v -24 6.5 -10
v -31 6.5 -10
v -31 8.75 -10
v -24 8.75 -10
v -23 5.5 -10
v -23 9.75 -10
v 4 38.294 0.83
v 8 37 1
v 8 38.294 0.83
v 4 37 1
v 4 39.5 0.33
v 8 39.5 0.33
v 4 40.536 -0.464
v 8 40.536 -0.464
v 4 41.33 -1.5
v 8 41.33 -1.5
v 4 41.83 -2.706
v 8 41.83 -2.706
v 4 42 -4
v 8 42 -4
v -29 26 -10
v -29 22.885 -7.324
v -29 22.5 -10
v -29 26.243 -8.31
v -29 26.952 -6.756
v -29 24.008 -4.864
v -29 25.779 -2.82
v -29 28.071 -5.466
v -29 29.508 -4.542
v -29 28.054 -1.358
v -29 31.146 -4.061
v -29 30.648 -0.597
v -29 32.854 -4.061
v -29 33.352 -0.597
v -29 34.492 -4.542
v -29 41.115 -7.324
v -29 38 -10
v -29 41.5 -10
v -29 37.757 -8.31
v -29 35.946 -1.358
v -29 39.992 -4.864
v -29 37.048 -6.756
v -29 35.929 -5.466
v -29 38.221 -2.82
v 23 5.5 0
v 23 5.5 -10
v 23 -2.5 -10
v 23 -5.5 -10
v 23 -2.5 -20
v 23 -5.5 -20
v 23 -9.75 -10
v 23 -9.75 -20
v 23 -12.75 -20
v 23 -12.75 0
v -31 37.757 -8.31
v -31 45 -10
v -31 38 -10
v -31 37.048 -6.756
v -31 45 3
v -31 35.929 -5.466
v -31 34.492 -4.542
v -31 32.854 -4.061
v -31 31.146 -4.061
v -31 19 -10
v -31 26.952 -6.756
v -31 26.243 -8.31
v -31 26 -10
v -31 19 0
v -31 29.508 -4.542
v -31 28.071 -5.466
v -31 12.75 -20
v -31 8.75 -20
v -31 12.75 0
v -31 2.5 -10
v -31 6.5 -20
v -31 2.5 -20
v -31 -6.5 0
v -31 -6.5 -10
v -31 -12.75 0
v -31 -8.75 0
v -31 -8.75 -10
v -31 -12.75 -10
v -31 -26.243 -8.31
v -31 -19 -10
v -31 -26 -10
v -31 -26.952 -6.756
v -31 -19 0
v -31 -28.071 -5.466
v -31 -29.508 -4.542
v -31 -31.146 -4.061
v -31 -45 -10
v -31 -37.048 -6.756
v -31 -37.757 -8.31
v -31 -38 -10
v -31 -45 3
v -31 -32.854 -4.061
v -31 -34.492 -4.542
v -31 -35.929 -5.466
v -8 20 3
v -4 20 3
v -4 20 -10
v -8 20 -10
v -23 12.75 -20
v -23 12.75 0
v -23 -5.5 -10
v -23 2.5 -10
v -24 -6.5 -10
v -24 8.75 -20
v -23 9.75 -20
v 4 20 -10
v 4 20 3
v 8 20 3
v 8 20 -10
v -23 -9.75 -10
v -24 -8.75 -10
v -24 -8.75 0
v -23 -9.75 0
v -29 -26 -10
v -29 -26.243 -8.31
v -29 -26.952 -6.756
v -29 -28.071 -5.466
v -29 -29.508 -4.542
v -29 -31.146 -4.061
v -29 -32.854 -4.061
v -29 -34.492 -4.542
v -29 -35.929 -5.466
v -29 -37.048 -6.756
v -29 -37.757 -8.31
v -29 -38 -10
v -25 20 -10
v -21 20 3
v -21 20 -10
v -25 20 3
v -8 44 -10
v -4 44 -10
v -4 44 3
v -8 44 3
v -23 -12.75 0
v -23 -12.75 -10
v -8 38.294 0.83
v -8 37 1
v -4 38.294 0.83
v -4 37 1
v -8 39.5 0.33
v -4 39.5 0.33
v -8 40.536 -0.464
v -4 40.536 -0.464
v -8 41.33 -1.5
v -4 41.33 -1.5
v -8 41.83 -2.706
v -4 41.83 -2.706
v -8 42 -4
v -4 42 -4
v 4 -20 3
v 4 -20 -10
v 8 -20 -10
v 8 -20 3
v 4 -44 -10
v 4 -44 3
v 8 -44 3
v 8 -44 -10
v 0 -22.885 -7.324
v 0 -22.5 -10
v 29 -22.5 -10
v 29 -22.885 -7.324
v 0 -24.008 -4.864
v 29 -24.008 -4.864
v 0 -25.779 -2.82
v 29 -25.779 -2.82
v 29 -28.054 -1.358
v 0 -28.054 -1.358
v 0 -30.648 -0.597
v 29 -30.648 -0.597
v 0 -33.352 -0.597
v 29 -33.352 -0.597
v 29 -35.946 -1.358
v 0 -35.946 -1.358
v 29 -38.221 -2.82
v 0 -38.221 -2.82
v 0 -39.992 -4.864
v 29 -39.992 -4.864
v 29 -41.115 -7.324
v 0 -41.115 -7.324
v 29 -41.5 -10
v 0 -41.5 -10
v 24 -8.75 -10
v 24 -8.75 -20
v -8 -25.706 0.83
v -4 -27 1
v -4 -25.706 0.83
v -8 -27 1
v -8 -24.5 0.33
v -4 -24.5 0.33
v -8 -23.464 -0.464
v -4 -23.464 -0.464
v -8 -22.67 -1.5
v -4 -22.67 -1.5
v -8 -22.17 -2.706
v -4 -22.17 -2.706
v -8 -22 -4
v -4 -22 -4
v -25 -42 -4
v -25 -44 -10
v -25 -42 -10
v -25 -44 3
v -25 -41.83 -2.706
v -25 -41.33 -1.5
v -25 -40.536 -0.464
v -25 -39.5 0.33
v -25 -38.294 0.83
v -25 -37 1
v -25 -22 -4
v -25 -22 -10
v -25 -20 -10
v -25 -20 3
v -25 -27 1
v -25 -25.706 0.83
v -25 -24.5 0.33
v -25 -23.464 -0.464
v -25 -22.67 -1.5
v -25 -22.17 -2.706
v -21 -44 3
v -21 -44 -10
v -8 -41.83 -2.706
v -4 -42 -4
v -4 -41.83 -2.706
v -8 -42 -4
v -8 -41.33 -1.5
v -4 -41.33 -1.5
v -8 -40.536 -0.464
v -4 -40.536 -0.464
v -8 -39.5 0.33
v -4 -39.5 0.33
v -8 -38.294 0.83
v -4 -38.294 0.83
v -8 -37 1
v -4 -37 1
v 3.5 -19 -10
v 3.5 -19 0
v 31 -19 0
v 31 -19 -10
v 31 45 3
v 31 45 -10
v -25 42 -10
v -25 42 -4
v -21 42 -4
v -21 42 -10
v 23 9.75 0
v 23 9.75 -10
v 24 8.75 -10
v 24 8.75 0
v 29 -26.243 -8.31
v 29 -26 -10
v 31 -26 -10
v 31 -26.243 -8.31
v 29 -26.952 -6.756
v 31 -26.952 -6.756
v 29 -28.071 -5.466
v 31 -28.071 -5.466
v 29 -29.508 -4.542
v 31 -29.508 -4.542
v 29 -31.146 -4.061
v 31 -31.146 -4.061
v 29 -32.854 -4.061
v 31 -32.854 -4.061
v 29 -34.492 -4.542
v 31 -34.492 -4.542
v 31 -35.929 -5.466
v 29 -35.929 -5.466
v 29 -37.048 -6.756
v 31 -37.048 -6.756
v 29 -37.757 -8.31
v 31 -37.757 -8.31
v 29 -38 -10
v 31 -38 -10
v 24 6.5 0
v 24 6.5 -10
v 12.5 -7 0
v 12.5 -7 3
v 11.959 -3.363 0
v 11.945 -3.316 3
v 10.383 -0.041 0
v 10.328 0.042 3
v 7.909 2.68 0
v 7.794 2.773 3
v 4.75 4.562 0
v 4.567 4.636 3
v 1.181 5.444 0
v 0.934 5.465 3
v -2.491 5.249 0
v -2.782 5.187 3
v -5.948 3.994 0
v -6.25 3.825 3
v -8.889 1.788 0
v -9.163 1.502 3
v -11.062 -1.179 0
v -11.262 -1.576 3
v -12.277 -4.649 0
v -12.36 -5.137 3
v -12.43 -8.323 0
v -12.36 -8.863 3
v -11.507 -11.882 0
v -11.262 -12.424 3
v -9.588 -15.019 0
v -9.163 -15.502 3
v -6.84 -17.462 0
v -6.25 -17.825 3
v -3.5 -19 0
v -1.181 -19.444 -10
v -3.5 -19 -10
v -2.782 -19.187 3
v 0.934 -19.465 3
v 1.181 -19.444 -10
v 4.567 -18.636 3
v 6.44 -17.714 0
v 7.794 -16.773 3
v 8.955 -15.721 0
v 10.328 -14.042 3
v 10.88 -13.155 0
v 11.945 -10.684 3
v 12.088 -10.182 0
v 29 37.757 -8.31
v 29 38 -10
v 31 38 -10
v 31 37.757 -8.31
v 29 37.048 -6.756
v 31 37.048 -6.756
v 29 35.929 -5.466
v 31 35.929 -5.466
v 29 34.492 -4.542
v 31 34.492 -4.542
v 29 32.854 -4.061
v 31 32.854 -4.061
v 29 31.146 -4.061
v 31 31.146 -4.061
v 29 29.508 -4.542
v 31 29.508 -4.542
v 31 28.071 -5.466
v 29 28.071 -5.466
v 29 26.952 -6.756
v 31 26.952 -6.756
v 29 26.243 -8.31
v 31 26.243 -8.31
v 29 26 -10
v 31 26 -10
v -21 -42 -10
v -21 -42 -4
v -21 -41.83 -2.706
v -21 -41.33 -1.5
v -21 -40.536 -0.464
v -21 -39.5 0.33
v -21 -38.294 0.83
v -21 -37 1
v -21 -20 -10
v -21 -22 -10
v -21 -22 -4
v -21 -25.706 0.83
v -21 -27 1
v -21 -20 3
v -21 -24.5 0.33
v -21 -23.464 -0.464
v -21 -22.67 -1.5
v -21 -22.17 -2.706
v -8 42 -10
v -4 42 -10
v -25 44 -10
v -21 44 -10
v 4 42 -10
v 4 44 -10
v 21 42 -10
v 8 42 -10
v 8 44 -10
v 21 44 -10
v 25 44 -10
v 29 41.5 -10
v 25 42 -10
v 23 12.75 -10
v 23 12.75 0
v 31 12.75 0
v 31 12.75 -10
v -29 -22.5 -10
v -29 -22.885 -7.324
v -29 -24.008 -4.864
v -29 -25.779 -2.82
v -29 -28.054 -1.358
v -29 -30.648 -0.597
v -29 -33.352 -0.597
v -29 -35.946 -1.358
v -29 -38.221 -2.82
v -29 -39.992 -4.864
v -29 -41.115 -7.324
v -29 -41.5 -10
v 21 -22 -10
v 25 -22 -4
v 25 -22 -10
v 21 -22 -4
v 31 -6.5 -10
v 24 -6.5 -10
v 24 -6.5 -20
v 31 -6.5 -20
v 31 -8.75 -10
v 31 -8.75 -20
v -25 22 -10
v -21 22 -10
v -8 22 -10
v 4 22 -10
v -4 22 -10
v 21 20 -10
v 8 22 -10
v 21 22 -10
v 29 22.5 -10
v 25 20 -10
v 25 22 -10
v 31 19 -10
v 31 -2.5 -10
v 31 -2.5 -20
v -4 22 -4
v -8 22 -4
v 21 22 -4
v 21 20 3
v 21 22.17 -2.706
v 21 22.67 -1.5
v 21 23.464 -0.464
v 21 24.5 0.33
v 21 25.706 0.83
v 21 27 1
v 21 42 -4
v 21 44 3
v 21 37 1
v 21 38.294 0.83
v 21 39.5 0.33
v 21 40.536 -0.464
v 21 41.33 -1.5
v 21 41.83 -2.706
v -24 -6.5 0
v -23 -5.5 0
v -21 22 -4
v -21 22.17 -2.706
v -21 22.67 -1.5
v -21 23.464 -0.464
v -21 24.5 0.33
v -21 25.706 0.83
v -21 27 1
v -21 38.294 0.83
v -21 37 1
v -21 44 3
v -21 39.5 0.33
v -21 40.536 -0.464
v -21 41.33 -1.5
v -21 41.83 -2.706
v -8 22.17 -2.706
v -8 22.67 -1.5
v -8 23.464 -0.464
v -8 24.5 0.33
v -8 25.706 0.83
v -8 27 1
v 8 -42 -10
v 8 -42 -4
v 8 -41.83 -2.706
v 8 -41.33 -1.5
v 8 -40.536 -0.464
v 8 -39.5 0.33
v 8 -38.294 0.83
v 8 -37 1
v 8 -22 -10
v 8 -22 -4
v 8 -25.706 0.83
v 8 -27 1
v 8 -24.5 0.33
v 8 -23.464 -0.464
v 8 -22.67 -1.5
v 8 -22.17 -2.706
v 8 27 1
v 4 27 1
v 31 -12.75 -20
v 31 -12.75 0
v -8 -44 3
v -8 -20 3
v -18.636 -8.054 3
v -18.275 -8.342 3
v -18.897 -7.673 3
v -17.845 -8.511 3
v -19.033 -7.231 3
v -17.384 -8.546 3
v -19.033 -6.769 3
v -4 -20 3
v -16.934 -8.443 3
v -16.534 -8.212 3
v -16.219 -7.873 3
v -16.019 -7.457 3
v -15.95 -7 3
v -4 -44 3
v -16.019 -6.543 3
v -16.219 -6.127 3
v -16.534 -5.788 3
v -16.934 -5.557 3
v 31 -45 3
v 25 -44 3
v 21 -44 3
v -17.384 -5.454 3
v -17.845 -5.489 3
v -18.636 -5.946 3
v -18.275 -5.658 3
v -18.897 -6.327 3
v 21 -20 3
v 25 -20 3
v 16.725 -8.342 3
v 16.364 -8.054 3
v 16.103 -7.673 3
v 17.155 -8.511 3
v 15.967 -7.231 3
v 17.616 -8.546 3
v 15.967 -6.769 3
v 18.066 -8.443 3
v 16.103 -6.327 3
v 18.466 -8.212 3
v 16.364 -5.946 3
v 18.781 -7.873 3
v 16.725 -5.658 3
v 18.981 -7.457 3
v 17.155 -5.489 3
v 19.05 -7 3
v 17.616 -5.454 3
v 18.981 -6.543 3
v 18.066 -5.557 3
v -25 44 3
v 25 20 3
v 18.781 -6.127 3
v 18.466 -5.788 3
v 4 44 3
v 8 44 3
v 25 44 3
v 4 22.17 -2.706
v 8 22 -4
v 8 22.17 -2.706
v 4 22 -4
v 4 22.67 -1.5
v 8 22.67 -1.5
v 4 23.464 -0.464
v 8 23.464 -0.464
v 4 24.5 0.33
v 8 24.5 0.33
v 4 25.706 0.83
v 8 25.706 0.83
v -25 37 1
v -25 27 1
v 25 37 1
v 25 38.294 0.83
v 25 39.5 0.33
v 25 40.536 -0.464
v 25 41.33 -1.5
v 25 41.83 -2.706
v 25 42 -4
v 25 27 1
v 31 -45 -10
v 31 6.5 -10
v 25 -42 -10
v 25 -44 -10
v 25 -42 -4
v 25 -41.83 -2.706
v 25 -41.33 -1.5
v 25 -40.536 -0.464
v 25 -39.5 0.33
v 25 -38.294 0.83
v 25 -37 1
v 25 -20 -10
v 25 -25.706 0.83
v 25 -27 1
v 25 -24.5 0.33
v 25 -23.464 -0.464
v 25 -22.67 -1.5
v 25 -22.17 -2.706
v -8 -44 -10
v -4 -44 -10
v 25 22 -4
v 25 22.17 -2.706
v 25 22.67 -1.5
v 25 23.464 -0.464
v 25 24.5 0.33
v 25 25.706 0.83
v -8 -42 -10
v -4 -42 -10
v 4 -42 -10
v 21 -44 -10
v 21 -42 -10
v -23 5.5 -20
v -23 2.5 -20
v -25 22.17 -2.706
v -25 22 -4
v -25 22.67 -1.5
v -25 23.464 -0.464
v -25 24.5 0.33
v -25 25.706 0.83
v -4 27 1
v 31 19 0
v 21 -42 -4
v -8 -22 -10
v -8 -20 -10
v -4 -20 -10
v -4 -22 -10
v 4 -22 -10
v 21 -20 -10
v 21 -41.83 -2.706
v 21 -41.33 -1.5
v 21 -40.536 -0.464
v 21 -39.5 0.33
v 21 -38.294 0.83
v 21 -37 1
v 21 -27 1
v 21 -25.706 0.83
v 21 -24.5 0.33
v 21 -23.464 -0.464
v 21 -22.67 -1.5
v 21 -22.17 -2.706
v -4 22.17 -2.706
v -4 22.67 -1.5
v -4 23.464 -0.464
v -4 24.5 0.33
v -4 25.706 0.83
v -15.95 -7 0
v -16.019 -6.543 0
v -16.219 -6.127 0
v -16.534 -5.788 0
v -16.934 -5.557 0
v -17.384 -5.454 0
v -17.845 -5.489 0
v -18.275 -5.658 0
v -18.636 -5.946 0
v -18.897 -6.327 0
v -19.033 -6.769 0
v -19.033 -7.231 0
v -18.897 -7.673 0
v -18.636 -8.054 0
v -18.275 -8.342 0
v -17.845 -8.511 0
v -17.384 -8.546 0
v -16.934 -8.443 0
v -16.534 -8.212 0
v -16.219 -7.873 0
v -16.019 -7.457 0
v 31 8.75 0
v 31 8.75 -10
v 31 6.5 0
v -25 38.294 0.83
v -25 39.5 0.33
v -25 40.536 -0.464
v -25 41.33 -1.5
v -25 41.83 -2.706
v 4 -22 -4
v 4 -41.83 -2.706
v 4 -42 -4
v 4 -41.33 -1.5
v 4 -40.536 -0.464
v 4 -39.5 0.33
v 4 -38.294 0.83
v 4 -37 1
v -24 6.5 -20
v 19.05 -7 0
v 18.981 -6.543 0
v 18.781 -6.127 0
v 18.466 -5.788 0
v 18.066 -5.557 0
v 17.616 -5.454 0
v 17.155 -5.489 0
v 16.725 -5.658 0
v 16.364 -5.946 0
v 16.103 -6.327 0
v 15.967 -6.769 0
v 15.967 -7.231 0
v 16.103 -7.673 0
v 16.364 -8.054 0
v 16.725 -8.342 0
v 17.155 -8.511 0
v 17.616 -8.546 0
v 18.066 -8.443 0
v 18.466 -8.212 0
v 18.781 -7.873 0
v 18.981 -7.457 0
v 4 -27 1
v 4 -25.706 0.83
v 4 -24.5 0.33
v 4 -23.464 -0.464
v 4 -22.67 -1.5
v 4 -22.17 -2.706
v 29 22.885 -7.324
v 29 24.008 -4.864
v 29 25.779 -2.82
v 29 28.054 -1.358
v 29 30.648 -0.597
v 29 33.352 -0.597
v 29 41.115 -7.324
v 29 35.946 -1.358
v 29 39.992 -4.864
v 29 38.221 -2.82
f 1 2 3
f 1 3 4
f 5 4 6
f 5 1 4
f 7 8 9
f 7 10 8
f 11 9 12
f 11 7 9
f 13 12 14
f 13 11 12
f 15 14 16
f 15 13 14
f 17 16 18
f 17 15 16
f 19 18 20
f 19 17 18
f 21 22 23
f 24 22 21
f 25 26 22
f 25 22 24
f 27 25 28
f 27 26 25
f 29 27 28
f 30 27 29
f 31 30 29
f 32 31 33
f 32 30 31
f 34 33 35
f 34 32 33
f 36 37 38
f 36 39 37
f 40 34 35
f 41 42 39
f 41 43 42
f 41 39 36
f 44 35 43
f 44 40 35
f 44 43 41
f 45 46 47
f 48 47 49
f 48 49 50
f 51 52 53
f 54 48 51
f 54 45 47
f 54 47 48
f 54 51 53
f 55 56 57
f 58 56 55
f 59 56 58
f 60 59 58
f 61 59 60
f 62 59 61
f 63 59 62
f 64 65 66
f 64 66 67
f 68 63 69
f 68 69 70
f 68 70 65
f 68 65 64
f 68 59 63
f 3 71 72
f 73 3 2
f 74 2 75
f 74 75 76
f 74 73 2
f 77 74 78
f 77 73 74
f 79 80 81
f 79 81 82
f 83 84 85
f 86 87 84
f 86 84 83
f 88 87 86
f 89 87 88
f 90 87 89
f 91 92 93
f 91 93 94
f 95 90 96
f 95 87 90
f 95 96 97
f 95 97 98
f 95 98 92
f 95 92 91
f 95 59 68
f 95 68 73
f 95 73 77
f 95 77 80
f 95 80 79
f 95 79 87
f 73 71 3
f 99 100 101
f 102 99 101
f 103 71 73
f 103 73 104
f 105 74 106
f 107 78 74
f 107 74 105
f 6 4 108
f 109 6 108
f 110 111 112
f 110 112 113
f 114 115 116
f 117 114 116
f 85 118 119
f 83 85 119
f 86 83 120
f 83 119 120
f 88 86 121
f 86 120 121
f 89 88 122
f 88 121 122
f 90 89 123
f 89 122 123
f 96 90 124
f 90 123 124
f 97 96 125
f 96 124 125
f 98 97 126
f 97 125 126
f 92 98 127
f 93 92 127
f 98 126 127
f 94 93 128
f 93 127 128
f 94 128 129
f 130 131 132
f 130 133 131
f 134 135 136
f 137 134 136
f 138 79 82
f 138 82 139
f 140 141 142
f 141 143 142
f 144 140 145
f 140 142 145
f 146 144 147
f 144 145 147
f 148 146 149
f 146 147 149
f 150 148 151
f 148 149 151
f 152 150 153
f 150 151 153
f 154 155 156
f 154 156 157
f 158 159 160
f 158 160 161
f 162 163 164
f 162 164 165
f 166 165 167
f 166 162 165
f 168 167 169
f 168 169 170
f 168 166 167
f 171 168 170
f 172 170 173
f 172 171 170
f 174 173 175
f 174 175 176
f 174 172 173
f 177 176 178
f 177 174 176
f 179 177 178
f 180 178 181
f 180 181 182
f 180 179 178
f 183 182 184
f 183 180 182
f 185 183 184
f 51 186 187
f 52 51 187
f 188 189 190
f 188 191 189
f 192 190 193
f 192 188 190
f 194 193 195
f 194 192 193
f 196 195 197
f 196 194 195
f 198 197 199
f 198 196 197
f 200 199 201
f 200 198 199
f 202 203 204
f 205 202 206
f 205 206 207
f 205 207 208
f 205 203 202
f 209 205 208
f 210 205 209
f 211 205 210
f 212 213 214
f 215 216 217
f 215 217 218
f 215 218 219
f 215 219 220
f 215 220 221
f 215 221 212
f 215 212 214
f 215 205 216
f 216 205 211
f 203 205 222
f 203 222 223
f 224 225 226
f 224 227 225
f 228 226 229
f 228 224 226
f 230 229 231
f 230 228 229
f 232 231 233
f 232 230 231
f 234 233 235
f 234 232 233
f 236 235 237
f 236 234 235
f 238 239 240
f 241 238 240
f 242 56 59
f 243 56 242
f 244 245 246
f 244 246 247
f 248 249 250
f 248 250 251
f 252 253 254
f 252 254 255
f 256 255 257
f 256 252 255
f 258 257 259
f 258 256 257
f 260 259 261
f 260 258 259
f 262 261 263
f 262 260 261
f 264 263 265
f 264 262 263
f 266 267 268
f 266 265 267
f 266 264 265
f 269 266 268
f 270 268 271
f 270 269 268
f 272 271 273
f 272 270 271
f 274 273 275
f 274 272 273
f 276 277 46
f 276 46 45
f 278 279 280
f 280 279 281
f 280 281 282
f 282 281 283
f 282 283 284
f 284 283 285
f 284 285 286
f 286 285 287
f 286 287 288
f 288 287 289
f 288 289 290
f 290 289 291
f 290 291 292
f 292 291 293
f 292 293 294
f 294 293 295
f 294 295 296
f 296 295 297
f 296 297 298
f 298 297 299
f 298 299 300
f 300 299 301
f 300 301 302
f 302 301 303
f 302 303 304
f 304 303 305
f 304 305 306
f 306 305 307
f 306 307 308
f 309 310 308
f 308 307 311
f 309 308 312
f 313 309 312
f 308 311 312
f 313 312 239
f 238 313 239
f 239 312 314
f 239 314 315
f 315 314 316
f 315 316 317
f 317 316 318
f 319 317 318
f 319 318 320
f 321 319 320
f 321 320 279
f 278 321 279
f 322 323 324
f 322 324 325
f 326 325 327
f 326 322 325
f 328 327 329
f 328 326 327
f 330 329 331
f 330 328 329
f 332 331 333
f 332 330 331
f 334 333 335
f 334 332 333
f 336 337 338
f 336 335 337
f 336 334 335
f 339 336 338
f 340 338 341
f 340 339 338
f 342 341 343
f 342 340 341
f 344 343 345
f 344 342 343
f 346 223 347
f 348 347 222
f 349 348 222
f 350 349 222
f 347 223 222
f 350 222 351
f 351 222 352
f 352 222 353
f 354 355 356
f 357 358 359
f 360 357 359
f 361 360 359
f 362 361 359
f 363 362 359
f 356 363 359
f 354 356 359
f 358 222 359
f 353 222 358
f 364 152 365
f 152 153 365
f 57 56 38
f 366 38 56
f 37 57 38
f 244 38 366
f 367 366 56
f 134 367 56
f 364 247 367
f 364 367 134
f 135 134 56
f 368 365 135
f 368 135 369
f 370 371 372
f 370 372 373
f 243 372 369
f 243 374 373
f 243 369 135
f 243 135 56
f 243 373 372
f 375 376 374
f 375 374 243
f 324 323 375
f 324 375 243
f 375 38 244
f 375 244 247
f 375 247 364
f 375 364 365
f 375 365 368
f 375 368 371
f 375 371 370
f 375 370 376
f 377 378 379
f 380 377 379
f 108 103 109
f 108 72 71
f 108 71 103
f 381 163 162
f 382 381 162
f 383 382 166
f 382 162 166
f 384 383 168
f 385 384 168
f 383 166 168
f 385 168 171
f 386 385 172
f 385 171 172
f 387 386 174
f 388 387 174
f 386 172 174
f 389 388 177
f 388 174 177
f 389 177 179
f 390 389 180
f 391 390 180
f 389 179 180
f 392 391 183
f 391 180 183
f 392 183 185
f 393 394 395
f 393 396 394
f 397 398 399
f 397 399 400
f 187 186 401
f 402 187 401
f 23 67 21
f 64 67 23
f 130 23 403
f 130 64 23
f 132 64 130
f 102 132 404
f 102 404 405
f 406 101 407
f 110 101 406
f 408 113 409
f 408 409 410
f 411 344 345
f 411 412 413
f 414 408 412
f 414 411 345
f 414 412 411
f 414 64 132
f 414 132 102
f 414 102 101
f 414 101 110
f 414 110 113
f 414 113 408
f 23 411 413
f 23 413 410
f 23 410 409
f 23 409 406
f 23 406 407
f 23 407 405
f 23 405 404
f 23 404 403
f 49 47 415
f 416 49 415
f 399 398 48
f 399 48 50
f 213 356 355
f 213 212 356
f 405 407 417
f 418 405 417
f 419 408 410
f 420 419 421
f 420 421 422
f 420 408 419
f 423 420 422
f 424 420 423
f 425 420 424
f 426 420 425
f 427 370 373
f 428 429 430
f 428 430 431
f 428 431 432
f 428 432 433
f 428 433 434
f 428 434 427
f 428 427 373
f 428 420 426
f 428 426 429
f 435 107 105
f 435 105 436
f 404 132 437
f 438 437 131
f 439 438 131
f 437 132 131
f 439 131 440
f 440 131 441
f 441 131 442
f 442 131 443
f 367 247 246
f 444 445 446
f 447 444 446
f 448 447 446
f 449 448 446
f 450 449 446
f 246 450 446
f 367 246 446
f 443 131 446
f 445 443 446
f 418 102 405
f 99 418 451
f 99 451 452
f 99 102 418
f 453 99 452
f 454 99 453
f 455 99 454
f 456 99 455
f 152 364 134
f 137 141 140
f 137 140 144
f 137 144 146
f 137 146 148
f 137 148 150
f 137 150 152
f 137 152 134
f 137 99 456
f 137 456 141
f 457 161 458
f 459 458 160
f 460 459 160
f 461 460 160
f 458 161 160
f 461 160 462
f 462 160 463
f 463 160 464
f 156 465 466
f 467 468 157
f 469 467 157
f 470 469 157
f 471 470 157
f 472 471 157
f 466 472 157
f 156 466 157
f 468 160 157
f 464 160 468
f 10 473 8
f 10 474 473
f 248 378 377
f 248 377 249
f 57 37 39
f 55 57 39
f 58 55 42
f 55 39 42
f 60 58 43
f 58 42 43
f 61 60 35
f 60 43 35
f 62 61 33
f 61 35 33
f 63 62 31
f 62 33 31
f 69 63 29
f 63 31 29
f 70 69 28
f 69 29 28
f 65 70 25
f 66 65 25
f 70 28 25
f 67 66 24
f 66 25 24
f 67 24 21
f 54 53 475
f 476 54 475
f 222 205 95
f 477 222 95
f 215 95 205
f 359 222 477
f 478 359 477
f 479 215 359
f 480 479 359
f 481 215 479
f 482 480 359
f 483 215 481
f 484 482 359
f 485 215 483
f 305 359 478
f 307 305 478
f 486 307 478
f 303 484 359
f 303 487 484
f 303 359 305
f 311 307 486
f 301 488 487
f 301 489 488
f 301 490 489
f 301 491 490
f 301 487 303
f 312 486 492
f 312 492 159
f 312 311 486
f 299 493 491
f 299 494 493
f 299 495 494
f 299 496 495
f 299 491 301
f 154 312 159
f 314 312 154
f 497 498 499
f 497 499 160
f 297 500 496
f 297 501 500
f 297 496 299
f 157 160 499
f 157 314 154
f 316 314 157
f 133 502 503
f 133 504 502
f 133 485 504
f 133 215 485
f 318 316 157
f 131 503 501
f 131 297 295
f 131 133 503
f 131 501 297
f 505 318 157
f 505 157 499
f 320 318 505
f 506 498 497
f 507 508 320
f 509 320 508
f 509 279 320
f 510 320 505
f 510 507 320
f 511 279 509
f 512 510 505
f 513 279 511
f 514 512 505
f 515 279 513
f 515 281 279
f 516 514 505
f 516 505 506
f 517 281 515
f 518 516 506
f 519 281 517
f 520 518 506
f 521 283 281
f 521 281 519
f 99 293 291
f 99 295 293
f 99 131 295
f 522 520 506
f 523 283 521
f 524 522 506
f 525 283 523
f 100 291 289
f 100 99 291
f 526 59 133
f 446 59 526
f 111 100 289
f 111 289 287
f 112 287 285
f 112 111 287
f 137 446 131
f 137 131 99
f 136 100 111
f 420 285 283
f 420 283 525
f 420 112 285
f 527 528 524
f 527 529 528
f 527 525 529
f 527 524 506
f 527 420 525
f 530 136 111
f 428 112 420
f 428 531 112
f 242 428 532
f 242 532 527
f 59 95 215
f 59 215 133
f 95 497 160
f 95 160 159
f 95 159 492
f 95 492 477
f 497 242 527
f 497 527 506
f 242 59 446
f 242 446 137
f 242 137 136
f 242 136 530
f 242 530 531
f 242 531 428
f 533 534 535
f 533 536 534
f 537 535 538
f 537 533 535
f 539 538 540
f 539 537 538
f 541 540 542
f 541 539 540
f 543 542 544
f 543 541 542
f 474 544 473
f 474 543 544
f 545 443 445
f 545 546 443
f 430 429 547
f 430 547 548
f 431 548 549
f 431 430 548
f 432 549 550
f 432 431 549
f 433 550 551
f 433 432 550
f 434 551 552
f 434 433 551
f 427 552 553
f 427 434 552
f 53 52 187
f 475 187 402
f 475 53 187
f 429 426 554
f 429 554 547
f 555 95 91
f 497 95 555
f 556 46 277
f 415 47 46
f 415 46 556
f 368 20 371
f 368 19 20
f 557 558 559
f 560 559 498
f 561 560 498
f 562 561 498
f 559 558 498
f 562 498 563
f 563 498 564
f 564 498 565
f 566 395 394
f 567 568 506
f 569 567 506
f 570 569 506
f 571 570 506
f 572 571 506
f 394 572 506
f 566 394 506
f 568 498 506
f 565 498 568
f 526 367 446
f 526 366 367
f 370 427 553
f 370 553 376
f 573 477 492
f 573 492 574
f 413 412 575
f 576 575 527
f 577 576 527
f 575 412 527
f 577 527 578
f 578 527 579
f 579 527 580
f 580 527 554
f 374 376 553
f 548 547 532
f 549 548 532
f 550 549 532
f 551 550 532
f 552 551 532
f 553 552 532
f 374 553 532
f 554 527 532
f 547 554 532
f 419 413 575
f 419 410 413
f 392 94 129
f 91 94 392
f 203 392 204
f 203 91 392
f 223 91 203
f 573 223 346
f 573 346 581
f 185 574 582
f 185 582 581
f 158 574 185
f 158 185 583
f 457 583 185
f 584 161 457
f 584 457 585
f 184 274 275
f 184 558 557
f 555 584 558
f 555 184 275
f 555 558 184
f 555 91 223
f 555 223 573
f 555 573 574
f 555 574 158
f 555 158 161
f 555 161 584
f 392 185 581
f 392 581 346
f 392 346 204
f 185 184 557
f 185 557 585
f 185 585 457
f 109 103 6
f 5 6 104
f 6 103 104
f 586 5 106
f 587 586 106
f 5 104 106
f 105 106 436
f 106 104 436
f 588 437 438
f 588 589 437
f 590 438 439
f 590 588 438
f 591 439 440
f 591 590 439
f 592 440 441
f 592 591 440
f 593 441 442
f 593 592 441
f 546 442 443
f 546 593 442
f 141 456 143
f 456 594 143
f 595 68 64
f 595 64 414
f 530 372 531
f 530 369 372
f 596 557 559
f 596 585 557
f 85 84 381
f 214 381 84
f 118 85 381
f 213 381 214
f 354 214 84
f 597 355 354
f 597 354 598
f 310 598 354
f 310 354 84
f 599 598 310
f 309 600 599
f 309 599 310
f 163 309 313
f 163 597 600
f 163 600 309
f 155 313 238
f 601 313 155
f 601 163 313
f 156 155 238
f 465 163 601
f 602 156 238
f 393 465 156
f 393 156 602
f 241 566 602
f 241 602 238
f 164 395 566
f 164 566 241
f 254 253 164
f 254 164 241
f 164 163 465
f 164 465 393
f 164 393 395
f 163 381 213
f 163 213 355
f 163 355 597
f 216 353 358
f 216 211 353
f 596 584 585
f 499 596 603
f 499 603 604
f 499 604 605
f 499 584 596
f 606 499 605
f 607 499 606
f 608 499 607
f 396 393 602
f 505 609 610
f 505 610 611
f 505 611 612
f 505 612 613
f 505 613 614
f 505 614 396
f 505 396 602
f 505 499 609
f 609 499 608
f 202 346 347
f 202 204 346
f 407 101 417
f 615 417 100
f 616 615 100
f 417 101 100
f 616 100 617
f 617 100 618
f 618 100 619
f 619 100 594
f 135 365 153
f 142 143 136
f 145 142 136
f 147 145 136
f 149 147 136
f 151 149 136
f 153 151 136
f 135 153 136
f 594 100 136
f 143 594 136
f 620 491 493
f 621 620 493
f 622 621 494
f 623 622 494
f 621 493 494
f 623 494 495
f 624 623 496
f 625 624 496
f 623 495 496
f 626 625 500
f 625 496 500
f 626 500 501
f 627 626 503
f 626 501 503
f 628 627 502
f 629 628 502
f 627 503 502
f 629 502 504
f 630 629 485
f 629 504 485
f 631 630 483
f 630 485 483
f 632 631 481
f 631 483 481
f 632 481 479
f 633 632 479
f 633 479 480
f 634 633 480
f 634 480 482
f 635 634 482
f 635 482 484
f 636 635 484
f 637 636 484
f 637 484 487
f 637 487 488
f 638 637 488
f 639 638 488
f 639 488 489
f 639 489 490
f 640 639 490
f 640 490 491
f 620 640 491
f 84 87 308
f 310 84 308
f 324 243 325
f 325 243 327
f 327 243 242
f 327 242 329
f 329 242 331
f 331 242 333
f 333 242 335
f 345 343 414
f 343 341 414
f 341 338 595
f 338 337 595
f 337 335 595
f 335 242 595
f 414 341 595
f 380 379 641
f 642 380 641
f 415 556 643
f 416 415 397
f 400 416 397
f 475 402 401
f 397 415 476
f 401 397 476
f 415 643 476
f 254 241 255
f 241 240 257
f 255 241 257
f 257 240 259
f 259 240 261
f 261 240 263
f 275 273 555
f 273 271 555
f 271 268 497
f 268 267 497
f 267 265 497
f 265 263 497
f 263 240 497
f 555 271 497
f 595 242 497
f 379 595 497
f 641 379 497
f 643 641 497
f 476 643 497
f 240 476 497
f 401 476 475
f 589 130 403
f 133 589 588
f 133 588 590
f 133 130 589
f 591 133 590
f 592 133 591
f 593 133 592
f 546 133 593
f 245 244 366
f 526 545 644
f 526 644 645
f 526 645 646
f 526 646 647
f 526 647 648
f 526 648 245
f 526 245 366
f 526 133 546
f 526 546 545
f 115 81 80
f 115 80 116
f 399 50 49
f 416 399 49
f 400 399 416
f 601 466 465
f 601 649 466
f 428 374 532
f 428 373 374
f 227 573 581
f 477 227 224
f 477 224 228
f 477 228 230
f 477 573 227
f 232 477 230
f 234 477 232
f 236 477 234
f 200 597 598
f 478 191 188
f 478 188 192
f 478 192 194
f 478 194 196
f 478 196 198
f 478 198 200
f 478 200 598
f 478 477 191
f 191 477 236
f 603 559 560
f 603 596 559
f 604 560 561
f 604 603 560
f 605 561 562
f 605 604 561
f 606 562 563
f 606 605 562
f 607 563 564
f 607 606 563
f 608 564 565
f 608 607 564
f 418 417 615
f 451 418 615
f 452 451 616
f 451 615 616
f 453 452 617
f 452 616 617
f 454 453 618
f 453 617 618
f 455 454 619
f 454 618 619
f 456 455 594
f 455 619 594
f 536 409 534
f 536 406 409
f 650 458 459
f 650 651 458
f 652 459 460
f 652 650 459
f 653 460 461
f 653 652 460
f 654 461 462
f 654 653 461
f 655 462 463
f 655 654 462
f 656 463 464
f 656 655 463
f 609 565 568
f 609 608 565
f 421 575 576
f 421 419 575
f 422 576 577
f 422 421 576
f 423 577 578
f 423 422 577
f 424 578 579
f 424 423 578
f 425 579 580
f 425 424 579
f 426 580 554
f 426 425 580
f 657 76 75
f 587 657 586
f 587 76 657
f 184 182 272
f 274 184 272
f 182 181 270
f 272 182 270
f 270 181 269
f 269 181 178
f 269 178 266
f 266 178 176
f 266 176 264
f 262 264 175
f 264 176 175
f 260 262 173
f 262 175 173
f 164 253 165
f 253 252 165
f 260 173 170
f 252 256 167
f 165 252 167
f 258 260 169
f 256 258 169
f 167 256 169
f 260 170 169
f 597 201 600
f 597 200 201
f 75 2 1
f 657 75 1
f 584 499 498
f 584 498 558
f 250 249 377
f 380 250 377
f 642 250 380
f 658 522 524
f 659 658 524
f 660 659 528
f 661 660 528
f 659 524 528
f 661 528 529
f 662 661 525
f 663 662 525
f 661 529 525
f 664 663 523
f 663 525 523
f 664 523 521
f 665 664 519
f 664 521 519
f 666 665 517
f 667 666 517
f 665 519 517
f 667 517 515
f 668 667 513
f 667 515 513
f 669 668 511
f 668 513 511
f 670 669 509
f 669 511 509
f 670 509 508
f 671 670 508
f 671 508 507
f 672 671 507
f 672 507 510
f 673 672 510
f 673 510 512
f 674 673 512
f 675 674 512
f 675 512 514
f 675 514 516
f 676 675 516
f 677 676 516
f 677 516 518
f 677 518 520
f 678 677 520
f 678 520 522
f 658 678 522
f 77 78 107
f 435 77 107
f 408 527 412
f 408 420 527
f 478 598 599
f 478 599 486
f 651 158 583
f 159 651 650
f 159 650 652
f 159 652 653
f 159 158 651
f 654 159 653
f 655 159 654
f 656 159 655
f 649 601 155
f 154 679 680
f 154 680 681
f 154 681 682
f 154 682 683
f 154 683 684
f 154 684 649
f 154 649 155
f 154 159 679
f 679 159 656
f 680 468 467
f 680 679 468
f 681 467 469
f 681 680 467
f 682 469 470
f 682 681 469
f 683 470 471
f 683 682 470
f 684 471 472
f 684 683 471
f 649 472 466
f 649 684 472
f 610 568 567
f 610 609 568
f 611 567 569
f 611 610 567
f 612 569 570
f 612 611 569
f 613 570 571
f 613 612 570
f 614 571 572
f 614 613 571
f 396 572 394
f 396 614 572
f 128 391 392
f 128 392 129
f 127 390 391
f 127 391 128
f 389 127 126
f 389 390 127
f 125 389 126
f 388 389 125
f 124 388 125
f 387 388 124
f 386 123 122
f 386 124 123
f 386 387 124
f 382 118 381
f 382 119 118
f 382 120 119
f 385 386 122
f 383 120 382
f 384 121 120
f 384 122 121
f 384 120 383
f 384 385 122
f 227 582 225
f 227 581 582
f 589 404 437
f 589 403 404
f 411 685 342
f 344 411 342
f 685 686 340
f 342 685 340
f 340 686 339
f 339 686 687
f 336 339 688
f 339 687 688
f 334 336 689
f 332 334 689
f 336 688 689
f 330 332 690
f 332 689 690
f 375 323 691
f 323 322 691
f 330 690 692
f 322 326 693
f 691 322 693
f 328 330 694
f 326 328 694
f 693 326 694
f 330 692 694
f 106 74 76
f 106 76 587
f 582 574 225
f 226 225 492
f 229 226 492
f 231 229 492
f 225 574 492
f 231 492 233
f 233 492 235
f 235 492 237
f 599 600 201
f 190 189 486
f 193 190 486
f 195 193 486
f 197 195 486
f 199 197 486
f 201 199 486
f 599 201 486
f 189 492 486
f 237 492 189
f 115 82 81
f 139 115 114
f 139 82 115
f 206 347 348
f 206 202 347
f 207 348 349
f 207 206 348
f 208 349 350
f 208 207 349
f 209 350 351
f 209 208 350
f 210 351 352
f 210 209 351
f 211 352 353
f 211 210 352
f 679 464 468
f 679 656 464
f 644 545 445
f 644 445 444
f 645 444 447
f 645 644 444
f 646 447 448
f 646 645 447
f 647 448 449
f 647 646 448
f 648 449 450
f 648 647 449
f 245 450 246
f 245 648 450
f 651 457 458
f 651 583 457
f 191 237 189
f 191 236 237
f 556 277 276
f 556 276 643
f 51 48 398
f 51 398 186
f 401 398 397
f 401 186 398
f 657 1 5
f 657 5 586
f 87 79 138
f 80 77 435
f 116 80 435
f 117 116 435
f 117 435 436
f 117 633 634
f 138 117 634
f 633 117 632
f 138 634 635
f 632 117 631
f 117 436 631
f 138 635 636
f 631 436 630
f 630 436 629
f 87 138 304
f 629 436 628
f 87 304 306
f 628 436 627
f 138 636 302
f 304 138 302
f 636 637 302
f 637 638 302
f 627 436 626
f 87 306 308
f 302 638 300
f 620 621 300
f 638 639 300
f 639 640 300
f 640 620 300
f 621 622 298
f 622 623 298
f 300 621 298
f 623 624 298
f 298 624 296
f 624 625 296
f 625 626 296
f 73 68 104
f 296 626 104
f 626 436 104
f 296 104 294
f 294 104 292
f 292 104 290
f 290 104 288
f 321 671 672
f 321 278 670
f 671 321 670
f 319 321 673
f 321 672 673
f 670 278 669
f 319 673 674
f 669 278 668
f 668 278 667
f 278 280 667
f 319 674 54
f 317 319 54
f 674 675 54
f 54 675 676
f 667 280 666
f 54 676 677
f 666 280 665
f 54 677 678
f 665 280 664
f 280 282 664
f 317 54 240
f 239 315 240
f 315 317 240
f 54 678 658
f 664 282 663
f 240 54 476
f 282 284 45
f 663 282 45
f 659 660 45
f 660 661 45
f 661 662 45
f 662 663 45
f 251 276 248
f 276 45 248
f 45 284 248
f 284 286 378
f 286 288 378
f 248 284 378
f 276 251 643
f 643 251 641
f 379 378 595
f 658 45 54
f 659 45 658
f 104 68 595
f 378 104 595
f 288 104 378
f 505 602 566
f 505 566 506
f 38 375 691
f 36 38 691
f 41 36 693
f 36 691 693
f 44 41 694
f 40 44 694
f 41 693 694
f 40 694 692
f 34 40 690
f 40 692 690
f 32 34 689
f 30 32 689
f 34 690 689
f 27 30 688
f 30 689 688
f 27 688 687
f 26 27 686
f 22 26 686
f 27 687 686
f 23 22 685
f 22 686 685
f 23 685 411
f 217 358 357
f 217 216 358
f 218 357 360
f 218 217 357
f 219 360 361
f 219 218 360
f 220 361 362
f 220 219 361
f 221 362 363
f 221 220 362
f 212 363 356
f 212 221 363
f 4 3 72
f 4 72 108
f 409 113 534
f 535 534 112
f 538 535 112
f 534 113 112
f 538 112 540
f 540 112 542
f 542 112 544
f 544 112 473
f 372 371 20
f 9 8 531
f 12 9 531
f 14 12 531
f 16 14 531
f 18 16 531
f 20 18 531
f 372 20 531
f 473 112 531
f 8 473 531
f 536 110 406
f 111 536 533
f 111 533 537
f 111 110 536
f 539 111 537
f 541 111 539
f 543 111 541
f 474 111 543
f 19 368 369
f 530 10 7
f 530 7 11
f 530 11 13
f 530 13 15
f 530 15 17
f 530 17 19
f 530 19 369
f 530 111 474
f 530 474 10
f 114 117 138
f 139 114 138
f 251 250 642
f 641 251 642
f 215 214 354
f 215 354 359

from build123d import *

# Parameters (mm, degrees)
F0_W          = 62
F0_H          = 90
F1_DEPTH      = 3
F2_W          = 62
F2_H          = 26
F3_DEPTH      = 10
F4_R          = 9.5
F5_DEPTH      = 29
F6_R          = 6
F7_DEPTH      = 31.001
F7_DEPTH_BACK = 31.001
F8_R          = 12.5
F8_R_2        = 1.55
F9_DEPTH      = 13.001
F18_DEPTH     = 2
F19_W         = 8
F19_H         = 25.5
F20_DEPTH     = 10
F21_W         = 8
F21_H         = 2.25
F22_DEPTH     = 10
F23_W         = 8
F23_H         = 4
F24_DEPTH     = 10
F25_SIZE      = 1


with BuildPart() as f1:
    # F0 (on Top) → F1 (new body)
    with BuildSketch(Plane.XY):
        Rectangle(F0_W, F0_H)
    extrude(amount=F1_DEPTH)

    # F2 (on face) → F3 (join)
    with BuildSketch(Plane(origin=(0, 0, 0), x_dir=(1, 0, 0), z_dir=(0, 0, -1))):
        with Locations((0, 32)):
            Rectangle(F2_W, F2_H)
        with Locations((0, -32)):
            Rectangle(F2_W, F2_H)
    extrude(amount=F3_DEPTH)

    # F4 (on Right) → F5 (cut, symmetric)
    with BuildSketch(Plane.YZ):
        with Locations((-32, -10)):
            Circle(F4_R)
        with Locations((32, -10)):
            Circle(F4_R)
    extrude(amount=F5_DEPTH, both=True, mode=Mode.SUBTRACT)

    # F6 (on Right) → F7 (cut, two sides)
    with BuildSketch(Plane.YZ) as f7_sk:
        with Locations((-32, -10)):
            Circle(F6_R)
        with Locations((32, -10)):
            Circle(F6_R)
    extrude(amount=-F7_DEPTH, mode=Mode.SUBTRACT)
    extrude(f7_sk.sketch, amount=F7_DEPTH_BACK, mode=Mode.SUBTRACT)

    # F8 (on face) → F9 (cut, through all)
    with BuildSketch(Plane.XY.offset(3)):
        with Locations((0, -7)):
            Circle(F8_R)
        with Locations((-17.5, -7)):
            Circle(F8_R_2)
        with Locations((17.5, -7)):
            Circle(F8_R_2)
    extrude(amount=-F9_DEPTH, mode=Mode.SUBTRACT)

    # F11 (on offset) + F13 (on offset) + F15 (on offset) + F17 (on offset) → F18 (cut, symmetric)
    with BuildSketch(Plane.YZ.offset(23)):
        with BuildLine():
            Line((-44, 3), (-44, -10))
            Line((-44, -10), (-42, -10))
            Line((-42, -10), (-42, -4))
            ThreePointArc((-42, -4), (-40.5355339059, -0.4644660941), (-37, 1))
            Line((-37, 1), (-27, 1))
            ThreePointArc((-27, 1), (-23.4644660941, -0.4644660941), (-22, -4))
            Line((-22, -4), (-22, -10))
            Line((-22, -10), (-20, -10))
            Line((-20, -10), (-20, 3))
            Line((-20, 3), (-44, 3))
        make_face()
        with BuildLine():
            Line((42, -4), (42, -10))
            Line((42, -10), (44, -10))
            Line((44, -10), (44, 3))
            Line((44, 3), (20, 3))
            Line((20, 3), (20, -10))
            Line((20, -10), (22, -10))
            Line((22, -10), (22, -4))
            ThreePointArc((22, -4), (23.4644660941, -0.4644660941), (27, 1))
            Line((27, 1), (37, 1))
            ThreePointArc((37, 1), (40.5355339059, -0.4644660941), (42, -4))
        make_face()
    with BuildSketch(Plane.YZ.offset(6)):
        with BuildLine():
            Line((-44, 3), (-44, -10))
            Line((-44, -10), (-42, -10))
            Line((-42, -10), (-42, -4))
            ThreePointArc((-42, -4), (-40.5355339059, -0.4644660941), (-37, 1))
            Line((-37, 1), (-27, 1))
            ThreePointArc((-27, 1), (-23.4644660941, -0.4644660941), (-22, -4))
            Line((-22, -4), (-22, -10))
            Line((-22, -10), (-20, -10))
            Line((-20, -10), (-20, 3))
            Line((-20, 3), (-44, 3))
        make_face()
        with BuildLine():
            Line((20, -10), (22, -10))
            Line((22, -10), (22, -4))
            ThreePointArc((22, -4), (23.4644660941, -0.4644660941), (27, 1))
            Line((27, 1), (37, 1))
            ThreePointArc((37, 1), (40.5355339059, -0.4644660941), (42, -4))
            Line((42, -4), (42, -10))
            Line((42, -10), (44, -10))
            Line((44, -10), (44, 3))
            Line((44, 3), (20, 3))
            Line((20, 3), (20, -10))
        make_face()
    with BuildSketch(Plane.YZ.offset(-23)):
        with BuildLine():
            Line((-44, 3), (-44, -10))
            Line((-44, -10), (-42, -10))
            Line((-42, -10), (-42, -4))
            ThreePointArc((-42, -4), (-40.5355339059, -0.4644660941), (-37, 1))
            Line((-37, 1), (-27, 1))
            ThreePointArc((-27, 1), (-23.4644660941, -0.4644660941), (-22, -4))
            Line((-22, -4), (-22, -10))
            Line((-22, -10), (-20, -10))
            Line((-20, -10), (-20, 3))
            Line((-20, 3), (-44, 3))
        make_face()
        with BuildLine():
            Line((42, -10), (44, -10))
            Line((44, -10), (44, 3))
            Line((44, 3), (20, 3))
            Line((20, 3), (20, -10))
            Line((20, -10), (22, -10))
            Line((22, -10), (22, -4))
            ThreePointArc((22, -4), (23.4644660941, -0.4644660941), (27, 1))
            Line((27, 1), (37, 1))
            ThreePointArc((37, 1), (40.5355339059, -0.4644660941), (42, -4))
            Line((42, -4), (42, -10))
        make_face()
    with BuildSketch(Plane.YZ.offset(-6)):
        with BuildLine():
            Line((-44, 3), (-44, -10))
            Line((-44, -10), (-42, -10))
            Line((-42, -10), (-42, -4))
            ThreePointArc((-42, -4), (-40.5355339059, -0.4644660941), (-37, 1))
            Line((-37, 1), (-27, 1))
            ThreePointArc((-27, 1), (-23.4644660941, -0.4644660941), (-22, -4))
            Line((-22, -4), (-22, -10))
            Line((-22, -10), (-20, -10))
            Line((-20, -10), (-20, 3))
            Line((-20, 3), (-44, 3))
        make_face()
        with BuildLine():
            Line((42, -4), (42, -10))
            Line((42, -10), (44, -10))
            Line((44, -10), (44, 3))
            Line((44, 3), (20, 3))
            Line((20, 3), (20, -10))
            Line((20, -10), (22, -10))
            Line((22, -10), (22, -4))
            ThreePointArc((22, -4), (23.4644660941, -0.4644660941), (27, 1))
            Line((27, 1), (37, 1))
            ThreePointArc((37, 1), (40.5355339059, -0.4644660941), (42, -4))
        make_face()
    extrude(amount=F18_DEPTH, both=True, mode=Mode.SUBTRACT)

    # F19 (on face) → F20 (join)
    with BuildSketch(Plane(origin=(0, 0, 0), x_dir=(1, 0, 0), z_dir=(0, 0, -1))):
        with Locations((27, 0)):
            Rectangle(F19_W, F19_H)
        with Locations((-27, 0)):
            Rectangle(F19_W, F19_H)
    extrude(amount=F20_DEPTH)

    # F21 (on face) → F22 (cut, through all)
    with BuildSketch(Plane(origin=(0, 0, -10), x_dir=(1, 0, 0), z_dir=(0, 0, -1))):
        with Locations((-27, 7.625)):
            Rectangle(F21_W, F21_H)
        with Locations((27, -7.625)):
            Rectangle(F21_W, F21_H)
    extrude(amount=-F22_DEPTH, mode=Mode.SUBTRACT)

    # F23 (on face) → F24 (join)
    with BuildSketch(Plane(origin=(0, 0, -10), x_dir=(1, 0, 0), z_dir=(0, 0, -1))):
        with Locations((-27, -10.75)):
            Rectangle(F23_W, F23_H)
        with Locations((27, 10.75)):
            Rectangle(F23_W, F23_H)
        with Locations((-27, -4.5)):
            Rectangle(F23_W, F23_H)
        with Locations((27, 4.5)):
            Rectangle(F23_W, F23_H)
    extrude(amount=F24_DEPTH)

    # F25
    f25_edges = [f1.edges().sort_by_distance(p)[0] for p in [
        (-23, -8.75, -5),
        (-23, -6.5, -5),
        (-23, 6.5, -15),
        (-23, 8.75, -15),
        (23, 6.5, -5),
        (23, 8.75, -5),
        (23, -6.5, -15),
        (23, -8.75, -15),
    ]]
    chamfer(f25_edges, length=F25_SIZE)


solid = f1.part
